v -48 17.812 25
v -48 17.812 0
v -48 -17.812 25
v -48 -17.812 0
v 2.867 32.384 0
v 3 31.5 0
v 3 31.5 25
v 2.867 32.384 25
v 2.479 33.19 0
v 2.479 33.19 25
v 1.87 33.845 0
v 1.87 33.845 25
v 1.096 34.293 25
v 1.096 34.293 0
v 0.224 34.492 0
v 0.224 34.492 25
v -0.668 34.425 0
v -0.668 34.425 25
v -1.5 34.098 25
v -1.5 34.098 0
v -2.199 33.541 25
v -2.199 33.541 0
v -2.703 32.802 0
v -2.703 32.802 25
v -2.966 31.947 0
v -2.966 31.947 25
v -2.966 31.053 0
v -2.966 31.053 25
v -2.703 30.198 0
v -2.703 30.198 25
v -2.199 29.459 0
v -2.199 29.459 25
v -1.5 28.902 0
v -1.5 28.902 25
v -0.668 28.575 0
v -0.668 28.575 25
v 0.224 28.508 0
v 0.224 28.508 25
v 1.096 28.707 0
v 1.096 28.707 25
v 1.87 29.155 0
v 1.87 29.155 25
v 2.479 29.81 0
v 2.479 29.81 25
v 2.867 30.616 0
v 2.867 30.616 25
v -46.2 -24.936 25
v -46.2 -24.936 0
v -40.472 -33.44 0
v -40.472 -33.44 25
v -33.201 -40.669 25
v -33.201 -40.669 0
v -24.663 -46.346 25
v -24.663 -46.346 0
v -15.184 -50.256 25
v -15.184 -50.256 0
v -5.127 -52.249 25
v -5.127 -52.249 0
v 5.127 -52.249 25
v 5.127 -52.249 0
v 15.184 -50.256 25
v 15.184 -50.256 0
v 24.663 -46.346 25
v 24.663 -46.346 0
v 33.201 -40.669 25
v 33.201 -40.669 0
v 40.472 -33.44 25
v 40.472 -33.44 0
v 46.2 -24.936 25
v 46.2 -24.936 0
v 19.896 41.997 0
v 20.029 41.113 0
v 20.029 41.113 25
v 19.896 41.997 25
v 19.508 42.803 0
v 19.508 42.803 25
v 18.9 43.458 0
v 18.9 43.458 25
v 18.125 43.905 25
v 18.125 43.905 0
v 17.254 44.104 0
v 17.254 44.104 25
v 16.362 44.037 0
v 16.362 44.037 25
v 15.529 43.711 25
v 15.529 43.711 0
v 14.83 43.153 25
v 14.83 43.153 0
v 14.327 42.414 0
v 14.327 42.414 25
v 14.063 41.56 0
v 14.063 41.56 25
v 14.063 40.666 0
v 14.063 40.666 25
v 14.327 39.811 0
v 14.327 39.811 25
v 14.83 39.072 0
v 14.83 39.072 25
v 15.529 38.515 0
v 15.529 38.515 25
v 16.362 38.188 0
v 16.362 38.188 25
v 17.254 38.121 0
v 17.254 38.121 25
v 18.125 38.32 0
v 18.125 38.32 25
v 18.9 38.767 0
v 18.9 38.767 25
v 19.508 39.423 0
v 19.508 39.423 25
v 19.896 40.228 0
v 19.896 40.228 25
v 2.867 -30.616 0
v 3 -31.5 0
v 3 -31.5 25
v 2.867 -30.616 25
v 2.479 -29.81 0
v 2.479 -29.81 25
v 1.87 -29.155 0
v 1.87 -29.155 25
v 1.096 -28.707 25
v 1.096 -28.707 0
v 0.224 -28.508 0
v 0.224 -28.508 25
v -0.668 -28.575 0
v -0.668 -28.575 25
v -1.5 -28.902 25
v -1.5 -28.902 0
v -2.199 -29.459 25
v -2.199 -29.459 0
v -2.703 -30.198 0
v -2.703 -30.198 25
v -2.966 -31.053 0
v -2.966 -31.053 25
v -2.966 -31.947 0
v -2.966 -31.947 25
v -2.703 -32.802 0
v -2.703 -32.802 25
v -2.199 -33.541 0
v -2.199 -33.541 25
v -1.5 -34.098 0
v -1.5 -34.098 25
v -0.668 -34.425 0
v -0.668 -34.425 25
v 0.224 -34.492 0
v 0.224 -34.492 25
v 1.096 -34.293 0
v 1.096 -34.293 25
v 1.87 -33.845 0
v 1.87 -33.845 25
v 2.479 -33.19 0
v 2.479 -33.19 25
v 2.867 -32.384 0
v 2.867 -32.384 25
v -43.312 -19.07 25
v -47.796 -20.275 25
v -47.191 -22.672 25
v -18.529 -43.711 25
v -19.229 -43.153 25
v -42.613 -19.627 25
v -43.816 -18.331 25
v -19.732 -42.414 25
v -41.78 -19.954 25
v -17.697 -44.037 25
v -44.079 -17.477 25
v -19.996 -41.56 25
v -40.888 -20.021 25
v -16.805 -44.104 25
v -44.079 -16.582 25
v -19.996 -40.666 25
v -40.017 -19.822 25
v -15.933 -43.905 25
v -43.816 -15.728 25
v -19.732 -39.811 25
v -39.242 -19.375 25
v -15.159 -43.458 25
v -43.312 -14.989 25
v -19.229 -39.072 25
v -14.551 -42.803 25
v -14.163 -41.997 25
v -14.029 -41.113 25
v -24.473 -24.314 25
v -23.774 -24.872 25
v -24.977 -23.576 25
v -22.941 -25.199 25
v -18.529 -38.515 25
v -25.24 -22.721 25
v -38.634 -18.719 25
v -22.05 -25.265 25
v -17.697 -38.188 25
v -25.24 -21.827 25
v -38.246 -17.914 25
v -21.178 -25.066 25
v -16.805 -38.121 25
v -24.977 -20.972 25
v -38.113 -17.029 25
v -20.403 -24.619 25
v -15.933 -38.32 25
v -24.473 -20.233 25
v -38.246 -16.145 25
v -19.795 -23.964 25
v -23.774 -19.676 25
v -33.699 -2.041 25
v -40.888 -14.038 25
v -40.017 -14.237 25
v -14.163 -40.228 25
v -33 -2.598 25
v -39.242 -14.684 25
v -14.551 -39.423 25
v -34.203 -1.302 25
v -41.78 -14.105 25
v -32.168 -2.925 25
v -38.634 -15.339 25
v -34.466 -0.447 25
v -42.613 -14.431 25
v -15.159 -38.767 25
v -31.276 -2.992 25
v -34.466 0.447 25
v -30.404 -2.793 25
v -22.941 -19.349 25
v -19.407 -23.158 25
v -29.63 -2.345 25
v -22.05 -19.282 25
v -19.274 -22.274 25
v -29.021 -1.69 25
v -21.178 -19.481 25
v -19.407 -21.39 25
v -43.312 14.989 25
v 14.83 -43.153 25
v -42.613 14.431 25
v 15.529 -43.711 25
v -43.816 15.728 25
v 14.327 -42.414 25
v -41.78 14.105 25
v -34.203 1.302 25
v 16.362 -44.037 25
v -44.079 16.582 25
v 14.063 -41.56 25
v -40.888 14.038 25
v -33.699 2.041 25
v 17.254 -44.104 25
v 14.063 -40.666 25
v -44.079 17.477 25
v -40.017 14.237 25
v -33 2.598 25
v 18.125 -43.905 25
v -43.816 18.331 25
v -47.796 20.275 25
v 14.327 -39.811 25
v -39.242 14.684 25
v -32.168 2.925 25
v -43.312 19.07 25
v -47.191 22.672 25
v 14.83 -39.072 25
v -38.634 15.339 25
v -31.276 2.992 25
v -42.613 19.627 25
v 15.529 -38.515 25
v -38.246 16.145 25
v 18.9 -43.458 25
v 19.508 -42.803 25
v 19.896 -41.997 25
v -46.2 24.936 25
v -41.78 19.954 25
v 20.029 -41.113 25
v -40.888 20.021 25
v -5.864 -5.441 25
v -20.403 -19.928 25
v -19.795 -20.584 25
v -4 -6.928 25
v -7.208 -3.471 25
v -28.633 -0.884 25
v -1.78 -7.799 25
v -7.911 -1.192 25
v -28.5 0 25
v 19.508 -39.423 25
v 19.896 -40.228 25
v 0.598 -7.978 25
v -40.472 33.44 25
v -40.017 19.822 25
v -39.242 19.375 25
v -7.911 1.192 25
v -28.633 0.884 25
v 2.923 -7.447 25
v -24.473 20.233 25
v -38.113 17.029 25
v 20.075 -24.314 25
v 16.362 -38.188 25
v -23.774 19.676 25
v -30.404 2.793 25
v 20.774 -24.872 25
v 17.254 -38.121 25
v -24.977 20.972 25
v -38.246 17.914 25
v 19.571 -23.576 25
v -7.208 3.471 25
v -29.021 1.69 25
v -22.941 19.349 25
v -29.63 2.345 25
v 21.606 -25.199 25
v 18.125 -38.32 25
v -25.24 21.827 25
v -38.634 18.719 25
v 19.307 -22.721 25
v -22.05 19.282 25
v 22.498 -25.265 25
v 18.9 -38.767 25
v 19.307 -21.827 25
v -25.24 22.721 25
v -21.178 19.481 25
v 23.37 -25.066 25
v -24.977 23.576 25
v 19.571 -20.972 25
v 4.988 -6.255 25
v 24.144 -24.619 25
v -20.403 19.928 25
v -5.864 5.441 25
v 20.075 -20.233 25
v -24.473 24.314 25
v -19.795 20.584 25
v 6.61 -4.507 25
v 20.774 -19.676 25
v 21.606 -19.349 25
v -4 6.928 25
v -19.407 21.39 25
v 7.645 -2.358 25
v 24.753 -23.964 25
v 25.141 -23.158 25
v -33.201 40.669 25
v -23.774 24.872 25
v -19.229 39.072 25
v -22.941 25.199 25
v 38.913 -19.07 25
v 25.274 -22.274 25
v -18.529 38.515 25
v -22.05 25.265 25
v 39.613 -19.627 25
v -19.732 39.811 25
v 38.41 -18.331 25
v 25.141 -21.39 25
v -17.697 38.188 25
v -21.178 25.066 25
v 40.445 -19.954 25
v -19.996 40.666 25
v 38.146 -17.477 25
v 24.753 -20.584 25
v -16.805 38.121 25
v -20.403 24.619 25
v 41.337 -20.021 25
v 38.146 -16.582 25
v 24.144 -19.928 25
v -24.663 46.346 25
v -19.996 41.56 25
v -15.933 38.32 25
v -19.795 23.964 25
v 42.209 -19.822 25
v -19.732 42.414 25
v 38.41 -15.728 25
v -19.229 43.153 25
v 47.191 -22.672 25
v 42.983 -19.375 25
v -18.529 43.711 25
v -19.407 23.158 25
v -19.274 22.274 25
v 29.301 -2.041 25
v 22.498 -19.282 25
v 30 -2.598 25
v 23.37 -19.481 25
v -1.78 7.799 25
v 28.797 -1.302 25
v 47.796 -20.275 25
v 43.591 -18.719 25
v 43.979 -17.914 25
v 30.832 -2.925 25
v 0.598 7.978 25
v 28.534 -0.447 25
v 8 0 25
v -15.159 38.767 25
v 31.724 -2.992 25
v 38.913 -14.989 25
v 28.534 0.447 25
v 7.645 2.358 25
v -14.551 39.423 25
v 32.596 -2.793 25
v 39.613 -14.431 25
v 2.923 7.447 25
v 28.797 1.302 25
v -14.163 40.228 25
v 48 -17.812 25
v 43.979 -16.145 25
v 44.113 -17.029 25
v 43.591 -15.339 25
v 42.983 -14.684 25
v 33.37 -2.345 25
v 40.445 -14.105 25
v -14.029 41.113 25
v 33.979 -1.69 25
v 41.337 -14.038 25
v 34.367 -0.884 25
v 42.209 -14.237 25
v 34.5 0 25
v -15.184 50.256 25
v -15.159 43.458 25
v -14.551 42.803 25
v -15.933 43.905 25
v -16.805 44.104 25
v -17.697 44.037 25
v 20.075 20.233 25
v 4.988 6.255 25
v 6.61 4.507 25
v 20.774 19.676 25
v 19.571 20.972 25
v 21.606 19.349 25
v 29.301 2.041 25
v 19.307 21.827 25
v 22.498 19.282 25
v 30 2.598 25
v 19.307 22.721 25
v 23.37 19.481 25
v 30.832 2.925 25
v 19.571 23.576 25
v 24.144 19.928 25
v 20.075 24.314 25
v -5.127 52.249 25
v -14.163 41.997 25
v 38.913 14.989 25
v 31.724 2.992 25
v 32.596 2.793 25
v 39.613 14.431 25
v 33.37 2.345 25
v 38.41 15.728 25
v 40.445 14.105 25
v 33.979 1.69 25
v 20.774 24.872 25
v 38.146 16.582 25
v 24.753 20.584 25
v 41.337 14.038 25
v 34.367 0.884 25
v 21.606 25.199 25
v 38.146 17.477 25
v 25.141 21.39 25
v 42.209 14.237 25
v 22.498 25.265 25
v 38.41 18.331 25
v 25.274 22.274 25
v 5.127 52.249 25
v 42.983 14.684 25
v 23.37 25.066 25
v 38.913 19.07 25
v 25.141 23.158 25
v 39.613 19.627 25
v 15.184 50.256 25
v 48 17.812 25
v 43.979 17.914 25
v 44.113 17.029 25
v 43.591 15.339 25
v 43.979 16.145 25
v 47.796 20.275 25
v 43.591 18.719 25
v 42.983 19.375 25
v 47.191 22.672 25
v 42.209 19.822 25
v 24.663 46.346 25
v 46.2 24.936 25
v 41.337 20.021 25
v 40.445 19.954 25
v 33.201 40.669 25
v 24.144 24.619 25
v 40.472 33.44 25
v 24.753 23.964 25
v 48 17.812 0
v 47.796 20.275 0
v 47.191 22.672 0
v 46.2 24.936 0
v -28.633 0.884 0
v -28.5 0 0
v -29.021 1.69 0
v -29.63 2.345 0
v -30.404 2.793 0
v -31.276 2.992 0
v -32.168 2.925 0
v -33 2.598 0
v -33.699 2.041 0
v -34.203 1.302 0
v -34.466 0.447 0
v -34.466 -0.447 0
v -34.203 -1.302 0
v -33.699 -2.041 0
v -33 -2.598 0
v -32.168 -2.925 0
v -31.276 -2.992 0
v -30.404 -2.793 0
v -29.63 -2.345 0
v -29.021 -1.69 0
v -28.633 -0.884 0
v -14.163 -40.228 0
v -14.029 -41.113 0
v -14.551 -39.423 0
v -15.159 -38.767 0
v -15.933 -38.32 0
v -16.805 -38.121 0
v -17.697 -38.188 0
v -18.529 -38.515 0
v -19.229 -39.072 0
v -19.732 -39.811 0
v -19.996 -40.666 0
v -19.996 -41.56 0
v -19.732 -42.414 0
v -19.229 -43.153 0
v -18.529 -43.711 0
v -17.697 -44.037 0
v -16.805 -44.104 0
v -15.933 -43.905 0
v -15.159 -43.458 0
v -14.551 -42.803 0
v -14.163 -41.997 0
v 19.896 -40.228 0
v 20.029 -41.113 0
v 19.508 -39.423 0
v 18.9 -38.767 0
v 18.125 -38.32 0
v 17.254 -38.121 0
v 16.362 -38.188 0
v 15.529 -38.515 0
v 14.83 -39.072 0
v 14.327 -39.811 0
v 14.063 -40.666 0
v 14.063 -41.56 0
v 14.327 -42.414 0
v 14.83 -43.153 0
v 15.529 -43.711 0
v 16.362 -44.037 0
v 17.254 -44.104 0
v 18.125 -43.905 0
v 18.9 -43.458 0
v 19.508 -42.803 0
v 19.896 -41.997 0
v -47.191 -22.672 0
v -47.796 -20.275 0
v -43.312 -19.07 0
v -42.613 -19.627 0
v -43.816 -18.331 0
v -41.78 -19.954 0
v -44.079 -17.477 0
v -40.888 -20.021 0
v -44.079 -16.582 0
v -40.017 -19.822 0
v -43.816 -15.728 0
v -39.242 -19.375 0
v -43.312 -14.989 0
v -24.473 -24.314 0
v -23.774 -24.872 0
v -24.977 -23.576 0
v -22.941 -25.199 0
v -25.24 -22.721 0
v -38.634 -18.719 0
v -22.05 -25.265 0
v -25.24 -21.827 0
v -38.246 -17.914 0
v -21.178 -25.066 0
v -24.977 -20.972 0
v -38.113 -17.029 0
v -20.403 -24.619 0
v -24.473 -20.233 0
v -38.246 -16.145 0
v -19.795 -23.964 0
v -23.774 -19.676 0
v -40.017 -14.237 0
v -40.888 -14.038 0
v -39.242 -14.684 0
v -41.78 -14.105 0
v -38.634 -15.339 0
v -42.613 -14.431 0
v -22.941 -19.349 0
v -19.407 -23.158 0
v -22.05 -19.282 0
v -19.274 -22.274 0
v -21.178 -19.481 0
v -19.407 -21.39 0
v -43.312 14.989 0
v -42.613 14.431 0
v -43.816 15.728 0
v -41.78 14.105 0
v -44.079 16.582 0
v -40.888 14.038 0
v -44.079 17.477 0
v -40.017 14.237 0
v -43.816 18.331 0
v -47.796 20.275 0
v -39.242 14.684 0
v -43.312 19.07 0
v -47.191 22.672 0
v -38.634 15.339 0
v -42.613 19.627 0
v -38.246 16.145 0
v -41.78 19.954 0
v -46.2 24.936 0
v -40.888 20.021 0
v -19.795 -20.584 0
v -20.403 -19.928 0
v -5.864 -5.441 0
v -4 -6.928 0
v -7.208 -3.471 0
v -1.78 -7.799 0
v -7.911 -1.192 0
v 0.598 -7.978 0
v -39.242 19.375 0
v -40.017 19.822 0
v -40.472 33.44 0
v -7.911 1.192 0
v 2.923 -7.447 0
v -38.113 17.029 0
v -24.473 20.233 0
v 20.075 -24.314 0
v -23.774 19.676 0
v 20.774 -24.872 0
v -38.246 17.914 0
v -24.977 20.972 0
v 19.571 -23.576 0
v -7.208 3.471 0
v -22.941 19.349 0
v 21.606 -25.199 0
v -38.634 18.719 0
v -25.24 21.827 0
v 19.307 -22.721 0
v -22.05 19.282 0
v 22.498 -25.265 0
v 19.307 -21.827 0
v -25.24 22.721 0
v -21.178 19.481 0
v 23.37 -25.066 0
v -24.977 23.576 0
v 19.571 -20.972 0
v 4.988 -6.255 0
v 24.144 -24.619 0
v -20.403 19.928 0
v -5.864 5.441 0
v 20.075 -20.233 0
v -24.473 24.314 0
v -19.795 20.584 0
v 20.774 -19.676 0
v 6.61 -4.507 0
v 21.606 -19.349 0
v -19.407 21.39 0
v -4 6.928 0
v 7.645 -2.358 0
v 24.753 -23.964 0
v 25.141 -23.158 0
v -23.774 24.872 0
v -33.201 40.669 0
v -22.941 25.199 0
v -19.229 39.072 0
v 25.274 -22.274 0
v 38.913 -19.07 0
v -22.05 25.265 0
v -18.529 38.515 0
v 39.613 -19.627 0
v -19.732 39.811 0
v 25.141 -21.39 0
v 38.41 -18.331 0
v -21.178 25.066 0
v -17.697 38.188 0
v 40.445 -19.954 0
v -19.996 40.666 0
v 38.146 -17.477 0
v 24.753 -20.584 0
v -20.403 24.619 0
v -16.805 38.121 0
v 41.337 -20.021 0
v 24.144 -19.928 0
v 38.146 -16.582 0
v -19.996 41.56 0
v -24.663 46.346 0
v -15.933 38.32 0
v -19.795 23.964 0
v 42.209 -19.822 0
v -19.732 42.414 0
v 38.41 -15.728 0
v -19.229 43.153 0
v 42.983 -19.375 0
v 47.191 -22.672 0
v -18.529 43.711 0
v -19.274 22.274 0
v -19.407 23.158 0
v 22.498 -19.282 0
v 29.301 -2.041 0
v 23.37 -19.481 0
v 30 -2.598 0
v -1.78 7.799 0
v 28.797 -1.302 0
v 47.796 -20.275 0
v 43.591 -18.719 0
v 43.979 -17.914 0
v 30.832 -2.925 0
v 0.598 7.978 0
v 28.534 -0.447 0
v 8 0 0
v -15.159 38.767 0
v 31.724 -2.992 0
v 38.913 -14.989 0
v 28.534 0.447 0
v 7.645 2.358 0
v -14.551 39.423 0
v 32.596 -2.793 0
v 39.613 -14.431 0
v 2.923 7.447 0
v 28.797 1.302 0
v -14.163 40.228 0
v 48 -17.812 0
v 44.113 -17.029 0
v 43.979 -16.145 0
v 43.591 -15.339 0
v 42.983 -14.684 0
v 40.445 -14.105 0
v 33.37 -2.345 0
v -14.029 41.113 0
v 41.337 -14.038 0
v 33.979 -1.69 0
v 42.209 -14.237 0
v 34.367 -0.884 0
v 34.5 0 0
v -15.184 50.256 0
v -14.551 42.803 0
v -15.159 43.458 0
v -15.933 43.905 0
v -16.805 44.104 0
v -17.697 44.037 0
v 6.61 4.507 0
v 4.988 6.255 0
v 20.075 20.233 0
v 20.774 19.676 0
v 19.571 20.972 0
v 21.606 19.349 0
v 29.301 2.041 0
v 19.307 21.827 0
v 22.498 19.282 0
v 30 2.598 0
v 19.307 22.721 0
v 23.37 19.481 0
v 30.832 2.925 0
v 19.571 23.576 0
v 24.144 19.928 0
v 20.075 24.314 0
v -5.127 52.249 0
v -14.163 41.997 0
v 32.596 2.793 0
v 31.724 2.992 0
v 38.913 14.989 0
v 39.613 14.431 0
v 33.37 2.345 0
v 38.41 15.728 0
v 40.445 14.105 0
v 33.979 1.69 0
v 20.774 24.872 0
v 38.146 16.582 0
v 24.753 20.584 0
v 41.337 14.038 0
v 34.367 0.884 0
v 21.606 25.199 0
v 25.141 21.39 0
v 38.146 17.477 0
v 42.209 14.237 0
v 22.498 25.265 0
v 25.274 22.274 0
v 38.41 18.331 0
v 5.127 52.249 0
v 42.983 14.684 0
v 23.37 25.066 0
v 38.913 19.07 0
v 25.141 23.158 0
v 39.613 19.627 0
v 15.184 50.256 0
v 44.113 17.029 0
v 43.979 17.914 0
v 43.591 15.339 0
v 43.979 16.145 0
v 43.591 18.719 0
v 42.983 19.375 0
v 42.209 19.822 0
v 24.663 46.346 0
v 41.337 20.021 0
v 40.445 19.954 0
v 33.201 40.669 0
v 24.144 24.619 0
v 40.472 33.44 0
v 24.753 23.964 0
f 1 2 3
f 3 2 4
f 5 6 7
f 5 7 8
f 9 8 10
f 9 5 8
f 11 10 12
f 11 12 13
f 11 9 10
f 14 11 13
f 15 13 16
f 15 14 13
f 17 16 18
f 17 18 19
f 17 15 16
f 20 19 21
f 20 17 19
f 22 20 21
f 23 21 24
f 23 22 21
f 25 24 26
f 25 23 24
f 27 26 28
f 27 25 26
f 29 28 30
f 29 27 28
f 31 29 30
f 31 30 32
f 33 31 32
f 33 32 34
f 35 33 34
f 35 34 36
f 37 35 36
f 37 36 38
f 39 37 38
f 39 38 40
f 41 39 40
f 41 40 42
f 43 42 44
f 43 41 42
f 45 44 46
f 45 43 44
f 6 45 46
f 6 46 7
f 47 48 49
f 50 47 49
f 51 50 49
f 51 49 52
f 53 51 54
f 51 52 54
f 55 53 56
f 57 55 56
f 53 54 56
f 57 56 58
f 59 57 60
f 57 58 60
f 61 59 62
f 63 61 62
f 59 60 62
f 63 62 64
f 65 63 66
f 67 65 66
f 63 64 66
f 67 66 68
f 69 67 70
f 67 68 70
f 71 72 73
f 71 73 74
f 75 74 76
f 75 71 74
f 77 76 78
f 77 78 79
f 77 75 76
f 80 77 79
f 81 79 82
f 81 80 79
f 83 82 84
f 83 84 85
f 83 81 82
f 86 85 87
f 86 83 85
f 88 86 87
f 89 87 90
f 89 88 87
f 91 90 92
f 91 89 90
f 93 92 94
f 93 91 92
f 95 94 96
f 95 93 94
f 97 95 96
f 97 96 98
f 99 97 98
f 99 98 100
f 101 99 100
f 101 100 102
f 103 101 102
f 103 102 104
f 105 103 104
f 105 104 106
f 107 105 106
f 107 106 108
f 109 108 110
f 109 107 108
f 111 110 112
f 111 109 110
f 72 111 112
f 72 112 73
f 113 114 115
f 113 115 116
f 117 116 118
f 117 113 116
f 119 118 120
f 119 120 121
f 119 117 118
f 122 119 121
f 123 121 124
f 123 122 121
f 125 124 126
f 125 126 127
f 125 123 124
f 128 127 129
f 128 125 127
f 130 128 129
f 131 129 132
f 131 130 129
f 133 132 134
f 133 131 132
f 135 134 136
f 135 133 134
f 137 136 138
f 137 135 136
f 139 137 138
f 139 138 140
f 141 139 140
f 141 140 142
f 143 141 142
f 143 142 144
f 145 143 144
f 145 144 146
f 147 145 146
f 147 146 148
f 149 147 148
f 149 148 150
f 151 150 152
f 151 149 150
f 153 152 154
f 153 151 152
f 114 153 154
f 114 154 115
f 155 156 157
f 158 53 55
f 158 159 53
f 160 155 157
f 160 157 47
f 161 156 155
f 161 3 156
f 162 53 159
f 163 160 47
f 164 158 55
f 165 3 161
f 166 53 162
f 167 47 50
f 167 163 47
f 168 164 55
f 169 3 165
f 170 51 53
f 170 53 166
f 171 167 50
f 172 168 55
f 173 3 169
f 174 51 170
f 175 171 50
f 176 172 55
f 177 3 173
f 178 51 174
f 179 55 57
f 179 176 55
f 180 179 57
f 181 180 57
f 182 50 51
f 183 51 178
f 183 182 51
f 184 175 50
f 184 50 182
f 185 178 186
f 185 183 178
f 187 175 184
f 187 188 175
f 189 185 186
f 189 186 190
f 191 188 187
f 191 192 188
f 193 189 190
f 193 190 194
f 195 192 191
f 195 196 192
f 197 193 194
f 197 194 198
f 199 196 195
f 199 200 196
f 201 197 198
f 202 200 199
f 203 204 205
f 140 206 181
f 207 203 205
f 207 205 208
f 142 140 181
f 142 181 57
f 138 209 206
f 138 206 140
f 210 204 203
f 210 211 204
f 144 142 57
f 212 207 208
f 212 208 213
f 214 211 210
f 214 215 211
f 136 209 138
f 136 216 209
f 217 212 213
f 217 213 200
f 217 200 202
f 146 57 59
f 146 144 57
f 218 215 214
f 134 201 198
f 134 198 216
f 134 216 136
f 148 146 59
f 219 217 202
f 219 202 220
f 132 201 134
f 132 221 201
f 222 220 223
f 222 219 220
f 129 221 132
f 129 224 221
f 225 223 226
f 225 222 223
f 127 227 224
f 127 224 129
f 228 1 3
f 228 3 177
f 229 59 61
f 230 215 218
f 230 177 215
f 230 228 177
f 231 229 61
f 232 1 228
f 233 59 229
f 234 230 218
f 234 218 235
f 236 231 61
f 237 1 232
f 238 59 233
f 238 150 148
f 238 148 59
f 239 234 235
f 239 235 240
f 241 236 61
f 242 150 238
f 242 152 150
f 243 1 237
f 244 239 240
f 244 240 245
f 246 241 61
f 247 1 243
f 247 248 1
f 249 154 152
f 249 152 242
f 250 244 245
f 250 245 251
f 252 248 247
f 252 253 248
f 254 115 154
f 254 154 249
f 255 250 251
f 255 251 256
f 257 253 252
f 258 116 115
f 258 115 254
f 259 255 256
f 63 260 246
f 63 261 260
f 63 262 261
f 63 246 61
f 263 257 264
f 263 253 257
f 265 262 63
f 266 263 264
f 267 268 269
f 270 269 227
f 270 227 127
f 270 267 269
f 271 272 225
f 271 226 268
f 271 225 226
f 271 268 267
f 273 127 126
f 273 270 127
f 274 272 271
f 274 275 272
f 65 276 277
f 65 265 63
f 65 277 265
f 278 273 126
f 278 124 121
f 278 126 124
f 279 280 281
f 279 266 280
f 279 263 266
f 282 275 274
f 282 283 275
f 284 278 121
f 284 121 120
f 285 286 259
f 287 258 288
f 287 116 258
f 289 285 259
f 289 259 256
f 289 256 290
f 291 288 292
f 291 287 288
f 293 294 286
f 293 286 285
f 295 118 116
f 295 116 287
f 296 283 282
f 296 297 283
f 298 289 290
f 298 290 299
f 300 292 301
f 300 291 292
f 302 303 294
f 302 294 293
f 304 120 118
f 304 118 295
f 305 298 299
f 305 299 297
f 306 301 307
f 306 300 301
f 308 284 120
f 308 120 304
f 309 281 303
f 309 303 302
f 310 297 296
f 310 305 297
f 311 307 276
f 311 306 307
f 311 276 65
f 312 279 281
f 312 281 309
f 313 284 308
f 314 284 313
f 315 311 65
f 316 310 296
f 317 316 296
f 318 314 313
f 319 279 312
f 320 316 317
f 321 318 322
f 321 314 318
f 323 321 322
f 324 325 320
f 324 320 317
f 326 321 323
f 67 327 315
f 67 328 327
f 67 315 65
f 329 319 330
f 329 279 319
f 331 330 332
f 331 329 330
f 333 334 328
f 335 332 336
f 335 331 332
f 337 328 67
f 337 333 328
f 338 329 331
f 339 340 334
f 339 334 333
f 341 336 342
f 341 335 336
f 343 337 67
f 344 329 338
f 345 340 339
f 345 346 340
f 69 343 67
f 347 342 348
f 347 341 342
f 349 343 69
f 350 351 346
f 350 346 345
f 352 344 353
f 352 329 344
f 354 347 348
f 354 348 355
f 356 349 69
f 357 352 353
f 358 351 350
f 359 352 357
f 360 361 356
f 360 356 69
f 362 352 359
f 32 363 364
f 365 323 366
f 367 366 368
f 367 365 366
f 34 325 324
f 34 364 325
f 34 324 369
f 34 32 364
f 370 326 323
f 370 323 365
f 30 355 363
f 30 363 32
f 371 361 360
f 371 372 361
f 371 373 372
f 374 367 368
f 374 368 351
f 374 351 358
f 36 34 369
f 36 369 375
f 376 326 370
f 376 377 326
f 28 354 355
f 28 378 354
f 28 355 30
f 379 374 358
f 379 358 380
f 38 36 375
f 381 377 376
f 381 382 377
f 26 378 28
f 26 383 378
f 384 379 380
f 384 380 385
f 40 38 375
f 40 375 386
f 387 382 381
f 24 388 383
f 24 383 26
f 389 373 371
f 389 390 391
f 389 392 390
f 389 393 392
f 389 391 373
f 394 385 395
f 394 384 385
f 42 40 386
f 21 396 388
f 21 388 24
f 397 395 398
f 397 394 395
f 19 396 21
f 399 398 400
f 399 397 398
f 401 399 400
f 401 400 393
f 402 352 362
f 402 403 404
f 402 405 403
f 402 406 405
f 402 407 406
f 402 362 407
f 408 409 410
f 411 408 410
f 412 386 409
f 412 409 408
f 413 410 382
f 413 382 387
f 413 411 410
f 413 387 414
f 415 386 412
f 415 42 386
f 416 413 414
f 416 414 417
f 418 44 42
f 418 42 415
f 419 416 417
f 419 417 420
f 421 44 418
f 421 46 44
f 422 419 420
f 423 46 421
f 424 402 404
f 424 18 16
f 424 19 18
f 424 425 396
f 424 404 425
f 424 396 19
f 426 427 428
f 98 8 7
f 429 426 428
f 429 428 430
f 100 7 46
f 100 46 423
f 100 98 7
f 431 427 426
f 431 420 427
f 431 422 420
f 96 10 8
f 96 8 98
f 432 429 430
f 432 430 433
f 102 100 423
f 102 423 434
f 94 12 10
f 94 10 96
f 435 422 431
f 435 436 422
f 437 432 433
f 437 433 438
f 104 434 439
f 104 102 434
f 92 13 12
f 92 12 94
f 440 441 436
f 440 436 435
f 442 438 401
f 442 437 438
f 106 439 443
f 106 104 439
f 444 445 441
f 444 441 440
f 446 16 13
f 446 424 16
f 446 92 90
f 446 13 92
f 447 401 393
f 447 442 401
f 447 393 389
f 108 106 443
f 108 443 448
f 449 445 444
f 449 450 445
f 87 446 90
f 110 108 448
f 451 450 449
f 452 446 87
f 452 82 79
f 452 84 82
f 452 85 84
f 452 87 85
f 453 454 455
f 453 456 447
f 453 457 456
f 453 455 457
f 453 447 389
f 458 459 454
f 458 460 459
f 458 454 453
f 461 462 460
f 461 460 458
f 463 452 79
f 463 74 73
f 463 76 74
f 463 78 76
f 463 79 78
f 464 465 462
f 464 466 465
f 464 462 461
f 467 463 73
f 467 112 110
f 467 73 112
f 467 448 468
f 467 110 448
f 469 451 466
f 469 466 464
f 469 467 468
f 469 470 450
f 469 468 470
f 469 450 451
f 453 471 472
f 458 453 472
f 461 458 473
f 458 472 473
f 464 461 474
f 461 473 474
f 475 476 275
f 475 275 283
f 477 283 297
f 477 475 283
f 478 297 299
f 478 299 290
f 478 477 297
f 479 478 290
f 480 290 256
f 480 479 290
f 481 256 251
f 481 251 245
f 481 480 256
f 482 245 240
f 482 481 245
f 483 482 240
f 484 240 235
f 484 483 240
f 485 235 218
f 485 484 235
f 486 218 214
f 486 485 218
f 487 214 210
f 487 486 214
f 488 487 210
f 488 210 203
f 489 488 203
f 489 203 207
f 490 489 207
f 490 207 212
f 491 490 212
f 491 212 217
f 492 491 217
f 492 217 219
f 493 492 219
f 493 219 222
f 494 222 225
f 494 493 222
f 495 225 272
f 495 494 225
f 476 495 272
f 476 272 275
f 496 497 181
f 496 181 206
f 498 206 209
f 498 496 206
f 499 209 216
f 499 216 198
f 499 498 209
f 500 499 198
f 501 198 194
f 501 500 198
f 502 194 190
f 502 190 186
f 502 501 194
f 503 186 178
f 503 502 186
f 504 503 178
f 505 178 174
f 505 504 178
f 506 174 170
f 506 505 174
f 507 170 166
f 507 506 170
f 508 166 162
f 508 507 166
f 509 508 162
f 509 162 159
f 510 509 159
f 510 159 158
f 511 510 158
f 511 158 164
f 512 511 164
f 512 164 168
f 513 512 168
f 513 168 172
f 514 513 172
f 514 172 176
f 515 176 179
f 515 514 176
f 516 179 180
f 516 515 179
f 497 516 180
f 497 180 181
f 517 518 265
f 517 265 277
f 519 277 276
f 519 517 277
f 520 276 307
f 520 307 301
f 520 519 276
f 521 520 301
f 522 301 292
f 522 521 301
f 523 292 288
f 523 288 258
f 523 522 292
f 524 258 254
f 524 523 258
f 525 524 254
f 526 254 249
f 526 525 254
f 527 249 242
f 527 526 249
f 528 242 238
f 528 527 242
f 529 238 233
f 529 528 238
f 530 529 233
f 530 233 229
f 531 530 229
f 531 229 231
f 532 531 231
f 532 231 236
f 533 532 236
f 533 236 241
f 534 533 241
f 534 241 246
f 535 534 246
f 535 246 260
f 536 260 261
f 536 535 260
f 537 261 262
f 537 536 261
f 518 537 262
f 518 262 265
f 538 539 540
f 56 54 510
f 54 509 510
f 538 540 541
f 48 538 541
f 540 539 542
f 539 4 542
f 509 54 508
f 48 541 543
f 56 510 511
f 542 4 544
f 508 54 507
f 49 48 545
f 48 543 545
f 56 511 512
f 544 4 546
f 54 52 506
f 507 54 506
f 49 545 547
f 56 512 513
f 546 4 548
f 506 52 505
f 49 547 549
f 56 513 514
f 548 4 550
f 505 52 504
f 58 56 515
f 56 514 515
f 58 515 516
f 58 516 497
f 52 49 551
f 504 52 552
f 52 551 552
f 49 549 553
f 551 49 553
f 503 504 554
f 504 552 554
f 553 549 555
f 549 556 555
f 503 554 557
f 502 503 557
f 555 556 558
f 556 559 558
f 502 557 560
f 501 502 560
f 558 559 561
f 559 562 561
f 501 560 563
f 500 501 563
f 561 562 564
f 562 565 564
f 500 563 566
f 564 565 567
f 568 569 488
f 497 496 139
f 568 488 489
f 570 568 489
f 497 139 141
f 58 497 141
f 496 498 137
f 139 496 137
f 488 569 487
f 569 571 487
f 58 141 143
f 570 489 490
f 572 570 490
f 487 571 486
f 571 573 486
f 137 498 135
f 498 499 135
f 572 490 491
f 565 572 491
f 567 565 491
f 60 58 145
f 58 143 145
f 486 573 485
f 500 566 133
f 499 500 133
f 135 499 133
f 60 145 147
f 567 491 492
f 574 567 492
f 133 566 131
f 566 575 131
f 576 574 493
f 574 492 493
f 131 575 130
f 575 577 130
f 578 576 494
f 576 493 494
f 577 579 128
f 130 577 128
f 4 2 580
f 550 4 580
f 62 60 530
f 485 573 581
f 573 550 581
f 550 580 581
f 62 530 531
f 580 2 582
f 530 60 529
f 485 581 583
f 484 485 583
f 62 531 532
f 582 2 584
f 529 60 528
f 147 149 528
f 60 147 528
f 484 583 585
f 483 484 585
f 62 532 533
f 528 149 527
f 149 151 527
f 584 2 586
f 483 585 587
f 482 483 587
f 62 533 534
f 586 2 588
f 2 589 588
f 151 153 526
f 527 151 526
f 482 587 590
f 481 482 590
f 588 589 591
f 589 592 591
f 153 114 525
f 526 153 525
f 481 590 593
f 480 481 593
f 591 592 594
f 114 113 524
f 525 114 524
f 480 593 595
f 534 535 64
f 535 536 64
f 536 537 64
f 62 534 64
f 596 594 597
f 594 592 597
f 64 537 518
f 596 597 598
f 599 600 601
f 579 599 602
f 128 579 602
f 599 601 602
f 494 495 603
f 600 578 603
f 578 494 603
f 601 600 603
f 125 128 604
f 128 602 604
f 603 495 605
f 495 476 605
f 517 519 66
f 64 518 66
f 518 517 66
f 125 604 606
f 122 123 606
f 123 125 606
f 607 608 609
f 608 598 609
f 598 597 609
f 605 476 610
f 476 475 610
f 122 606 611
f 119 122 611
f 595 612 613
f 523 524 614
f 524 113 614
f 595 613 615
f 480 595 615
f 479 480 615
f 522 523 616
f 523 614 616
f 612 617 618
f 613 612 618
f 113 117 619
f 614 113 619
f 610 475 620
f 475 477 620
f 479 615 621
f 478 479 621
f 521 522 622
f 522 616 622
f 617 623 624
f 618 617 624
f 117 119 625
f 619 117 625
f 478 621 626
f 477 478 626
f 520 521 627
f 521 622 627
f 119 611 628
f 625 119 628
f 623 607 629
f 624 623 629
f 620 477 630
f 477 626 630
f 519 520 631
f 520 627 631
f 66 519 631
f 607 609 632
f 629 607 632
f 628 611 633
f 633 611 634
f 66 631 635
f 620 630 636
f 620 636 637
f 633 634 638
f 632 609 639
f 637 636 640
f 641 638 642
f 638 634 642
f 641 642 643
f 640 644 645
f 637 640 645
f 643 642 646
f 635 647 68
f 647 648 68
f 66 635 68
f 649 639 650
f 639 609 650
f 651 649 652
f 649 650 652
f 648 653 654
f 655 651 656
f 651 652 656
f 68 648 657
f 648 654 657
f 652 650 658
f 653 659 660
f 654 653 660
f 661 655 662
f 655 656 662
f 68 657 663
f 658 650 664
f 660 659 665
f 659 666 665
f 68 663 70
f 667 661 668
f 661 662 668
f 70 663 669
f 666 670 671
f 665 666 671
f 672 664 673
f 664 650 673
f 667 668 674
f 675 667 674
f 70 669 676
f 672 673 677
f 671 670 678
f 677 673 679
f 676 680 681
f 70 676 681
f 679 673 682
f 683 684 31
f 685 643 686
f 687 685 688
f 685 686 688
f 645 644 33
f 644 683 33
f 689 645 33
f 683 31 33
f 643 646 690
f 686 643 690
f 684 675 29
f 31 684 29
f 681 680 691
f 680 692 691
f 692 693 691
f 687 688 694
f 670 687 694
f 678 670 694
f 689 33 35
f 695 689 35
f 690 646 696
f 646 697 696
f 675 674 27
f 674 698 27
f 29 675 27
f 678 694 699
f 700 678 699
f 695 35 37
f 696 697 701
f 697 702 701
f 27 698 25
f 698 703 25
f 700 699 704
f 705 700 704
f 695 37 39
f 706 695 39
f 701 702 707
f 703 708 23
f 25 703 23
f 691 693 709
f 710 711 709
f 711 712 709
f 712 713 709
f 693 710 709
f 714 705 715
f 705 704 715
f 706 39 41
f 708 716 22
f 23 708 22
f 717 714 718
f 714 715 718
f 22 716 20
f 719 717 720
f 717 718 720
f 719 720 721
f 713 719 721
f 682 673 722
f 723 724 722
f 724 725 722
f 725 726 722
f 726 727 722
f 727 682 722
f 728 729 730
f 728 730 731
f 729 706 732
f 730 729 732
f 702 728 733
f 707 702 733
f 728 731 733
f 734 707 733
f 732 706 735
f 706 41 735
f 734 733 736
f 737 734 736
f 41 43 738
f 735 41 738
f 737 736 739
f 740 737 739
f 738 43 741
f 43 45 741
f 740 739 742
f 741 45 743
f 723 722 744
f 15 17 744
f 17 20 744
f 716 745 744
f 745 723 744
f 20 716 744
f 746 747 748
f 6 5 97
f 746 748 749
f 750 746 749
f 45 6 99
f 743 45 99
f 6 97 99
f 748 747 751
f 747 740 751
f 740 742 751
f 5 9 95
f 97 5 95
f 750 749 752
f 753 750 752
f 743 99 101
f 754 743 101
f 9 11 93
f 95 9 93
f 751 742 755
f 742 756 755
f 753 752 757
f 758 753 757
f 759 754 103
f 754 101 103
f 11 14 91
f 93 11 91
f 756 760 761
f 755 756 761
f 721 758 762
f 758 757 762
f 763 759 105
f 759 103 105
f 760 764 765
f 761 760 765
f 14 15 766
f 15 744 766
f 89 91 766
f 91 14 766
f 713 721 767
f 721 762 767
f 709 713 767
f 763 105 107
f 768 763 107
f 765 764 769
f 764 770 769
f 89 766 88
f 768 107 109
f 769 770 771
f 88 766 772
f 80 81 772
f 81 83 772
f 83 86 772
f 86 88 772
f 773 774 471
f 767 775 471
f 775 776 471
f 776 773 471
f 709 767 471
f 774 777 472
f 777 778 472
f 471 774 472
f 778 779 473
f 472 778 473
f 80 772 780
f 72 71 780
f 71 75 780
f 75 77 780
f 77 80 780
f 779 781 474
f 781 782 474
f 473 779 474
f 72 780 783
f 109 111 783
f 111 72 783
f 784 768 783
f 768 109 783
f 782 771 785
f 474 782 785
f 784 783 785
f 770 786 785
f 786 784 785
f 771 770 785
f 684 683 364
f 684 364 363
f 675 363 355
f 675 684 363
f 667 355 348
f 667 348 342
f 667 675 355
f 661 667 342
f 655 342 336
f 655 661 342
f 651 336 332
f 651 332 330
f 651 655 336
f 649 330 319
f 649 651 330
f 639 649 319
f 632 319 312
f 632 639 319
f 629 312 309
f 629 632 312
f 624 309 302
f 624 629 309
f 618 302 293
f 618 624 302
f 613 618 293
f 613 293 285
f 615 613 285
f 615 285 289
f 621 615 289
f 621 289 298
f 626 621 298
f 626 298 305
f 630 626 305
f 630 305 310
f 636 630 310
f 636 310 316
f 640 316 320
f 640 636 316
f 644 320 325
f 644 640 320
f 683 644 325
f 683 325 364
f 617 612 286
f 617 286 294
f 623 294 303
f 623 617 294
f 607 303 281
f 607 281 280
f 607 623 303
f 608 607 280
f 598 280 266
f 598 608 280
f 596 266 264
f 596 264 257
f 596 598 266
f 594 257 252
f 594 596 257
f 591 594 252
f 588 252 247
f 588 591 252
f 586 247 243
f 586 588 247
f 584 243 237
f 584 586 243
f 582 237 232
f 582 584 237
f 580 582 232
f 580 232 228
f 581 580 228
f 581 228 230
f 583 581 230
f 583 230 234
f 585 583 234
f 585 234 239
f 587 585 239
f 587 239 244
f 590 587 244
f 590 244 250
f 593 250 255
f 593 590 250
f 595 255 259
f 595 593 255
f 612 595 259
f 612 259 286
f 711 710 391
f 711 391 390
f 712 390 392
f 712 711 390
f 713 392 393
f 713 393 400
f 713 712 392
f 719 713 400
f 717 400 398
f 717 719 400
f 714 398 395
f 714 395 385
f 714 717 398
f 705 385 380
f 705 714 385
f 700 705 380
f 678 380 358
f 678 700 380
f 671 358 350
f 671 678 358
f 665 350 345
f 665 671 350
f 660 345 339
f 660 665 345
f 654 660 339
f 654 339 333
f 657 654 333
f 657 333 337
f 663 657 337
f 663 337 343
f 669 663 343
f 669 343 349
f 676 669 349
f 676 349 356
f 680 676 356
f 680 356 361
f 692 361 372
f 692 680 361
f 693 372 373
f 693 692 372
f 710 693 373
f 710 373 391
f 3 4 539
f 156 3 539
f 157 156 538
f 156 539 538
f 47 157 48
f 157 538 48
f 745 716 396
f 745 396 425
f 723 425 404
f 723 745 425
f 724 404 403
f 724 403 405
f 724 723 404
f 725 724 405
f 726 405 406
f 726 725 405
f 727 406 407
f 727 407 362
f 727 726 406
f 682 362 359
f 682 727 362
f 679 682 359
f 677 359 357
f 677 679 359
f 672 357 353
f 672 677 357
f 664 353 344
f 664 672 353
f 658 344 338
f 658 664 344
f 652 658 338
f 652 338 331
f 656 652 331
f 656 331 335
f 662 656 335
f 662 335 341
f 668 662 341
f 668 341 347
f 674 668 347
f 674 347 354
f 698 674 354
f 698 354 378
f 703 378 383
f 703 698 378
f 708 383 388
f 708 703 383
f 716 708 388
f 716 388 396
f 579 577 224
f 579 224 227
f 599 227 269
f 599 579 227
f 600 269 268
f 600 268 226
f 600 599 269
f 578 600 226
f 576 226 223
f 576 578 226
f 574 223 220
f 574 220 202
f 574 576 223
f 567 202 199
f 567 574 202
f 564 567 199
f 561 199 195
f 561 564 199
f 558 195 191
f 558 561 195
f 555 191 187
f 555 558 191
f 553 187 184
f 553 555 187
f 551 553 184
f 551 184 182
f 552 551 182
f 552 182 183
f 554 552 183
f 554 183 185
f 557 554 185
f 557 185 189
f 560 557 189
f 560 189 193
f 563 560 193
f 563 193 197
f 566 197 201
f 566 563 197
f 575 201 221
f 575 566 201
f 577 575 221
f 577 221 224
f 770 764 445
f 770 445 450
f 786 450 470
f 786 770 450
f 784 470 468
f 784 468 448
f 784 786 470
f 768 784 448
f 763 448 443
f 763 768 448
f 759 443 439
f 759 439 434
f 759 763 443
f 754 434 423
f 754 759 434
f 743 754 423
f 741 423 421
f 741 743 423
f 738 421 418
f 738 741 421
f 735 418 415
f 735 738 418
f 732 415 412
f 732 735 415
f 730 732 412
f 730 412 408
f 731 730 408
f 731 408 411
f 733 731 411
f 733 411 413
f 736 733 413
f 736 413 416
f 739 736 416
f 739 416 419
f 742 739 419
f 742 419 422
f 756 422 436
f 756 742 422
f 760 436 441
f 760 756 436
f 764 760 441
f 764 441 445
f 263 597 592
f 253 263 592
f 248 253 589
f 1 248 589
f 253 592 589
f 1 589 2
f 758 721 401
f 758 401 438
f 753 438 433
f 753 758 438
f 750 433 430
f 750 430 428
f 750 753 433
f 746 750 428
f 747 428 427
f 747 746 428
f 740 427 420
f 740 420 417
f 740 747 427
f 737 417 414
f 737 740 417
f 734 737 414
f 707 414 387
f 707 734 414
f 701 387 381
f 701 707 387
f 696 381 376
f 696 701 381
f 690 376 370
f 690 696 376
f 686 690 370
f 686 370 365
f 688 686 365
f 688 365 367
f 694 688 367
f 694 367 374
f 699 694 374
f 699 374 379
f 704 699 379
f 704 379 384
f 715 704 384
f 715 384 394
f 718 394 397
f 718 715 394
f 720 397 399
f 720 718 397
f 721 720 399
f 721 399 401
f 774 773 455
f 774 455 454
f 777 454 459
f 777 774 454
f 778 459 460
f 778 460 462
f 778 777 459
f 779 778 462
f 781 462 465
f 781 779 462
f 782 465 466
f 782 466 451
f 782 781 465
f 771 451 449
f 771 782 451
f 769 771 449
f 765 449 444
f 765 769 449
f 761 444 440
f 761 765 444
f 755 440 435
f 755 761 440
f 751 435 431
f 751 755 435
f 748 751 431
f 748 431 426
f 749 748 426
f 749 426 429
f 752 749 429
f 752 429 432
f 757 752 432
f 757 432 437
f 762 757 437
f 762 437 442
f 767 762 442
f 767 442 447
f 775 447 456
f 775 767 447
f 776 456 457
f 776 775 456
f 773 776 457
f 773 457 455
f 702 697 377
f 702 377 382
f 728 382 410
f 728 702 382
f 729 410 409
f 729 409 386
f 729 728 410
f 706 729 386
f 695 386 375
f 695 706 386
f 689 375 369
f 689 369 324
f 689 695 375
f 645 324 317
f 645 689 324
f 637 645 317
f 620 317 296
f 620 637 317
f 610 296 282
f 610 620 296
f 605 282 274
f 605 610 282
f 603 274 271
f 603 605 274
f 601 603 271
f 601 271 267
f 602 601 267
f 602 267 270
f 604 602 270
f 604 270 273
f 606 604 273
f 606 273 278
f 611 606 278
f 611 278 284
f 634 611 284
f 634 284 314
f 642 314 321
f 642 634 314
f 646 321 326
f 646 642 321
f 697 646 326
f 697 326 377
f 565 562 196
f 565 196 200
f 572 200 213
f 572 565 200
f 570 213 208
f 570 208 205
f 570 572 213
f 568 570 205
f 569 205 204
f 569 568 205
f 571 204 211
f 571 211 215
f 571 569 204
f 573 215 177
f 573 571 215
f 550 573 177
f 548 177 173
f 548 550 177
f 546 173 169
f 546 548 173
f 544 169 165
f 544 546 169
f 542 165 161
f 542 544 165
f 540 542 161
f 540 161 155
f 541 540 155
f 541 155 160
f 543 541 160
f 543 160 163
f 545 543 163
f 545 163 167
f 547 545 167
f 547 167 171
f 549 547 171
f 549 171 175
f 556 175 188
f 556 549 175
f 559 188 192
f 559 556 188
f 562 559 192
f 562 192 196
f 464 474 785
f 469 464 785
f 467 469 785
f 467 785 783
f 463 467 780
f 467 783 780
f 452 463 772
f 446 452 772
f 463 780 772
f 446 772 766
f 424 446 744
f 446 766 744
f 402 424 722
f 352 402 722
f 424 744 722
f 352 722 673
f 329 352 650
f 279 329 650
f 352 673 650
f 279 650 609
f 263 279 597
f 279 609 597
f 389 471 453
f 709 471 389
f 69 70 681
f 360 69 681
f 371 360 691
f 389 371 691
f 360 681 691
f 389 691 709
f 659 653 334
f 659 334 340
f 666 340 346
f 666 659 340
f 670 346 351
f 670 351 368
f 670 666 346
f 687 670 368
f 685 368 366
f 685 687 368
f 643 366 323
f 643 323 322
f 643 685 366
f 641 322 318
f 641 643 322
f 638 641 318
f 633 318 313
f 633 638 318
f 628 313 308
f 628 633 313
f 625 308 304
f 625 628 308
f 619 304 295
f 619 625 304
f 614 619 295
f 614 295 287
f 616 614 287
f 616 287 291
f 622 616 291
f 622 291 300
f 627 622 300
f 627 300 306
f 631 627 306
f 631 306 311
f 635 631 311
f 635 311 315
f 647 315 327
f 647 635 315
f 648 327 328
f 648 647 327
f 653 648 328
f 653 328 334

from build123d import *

# Parameters (mm, degrees)
SKETCH_R   = 3
SKETCH_R_2 = 8
PAD_DEPTH  = 25


with BuildPart() as part:
    # Sketch → Pad (new body)
    with BuildSketch(Plane.XY):
        with BuildLine():
            ThreePointArc((-46.2, -24.936118), (0, -52.5), (46.2, -24.936118))
            ThreePointArc((46.2, -24.936118), (47.54304, -21.485748), (48, -17.811513))
            Line((48, 17.811513), (48, -17.811513))
            ThreePointArc((48, 17.811513), (47.54304, 21.485748), (46.2, 24.936118))
            ThreePointArc((46.2, 24.936118), (0, 52.5), (-46.2, 24.936118))
            ThreePointArc((-46.2, 24.936118), (-47.54304, 21.485748), (-48, 17.811513))
            Line((-48, 17.811513), (-48, -17.811513))
            ThreePointArc((-48, -17.811513), (-47.54304, -21.485748), (-46.2, -24.936118))
        make_face()
        with Locations((22.273864, 22.273864)):
            Circle(SKETCH_R, mode=Mode.SUBTRACT)
        with Locations((0, 31.5)):
            Circle(SKETCH_R, mode=Mode.SUBTRACT)
        with Locations((31.5, 0)):
            Circle(SKETCH_R, mode=Mode.SUBTRACT)
        with Locations((0, -31.5)):
            Circle(SKETCH_R, mode=Mode.SUBTRACT)
        with Locations((-22.273864, -22.273864)):
            Circle(SKETCH_R, mode=Mode.SUBTRACT)
        with Locations((-31.5, 0)):
            Circle(SKETCH_R, mode=Mode.SUBTRACT)
        with Locations((-22.273864, 22.273864)):
            Circle(SKETCH_R, mode=Mode.SUBTRACT)
        with Locations((22.273864, -22.273864)):
            Circle(SKETCH_R, mode=Mode.SUBTRACT)
        with Locations((-17.029413, 41.112639)):
            Circle(SKETCH_R, mode=Mode.SUBTRACT)
        with Locations((17.029413, 41.112639)):
            Circle(SKETCH_R, mode=Mode.SUBTRACT)
        with Locations((41.112639, 17.029413)):
            Circle(SKETCH_R, mode=Mode.SUBTRACT)
        with Locations((41.112639, -17.029413)):
            Circle(SKETCH_R, mode=Mode.SUBTRACT)
        with Locations((17.029413, -41.112639)):
            Circle(SKETCH_R, mode=Mode.SUBTRACT)
        with Locations((-17.029413, -41.112639)):
            Circle(SKETCH_R, mode=Mode.SUBTRACT)
        with Locations((-41.112639, -17.029413)):
            Circle(SKETCH_R, mode=Mode.SUBTRACT)
        with Locations((-41.112639, 17.029413)):
            Circle(SKETCH_R, mode=Mode.SUBTRACT)
        Circle(SKETCH_R_2, mode=Mode.SUBTRACT)
    extrude(amount=PAD_DEPTH)


solid = part.part
